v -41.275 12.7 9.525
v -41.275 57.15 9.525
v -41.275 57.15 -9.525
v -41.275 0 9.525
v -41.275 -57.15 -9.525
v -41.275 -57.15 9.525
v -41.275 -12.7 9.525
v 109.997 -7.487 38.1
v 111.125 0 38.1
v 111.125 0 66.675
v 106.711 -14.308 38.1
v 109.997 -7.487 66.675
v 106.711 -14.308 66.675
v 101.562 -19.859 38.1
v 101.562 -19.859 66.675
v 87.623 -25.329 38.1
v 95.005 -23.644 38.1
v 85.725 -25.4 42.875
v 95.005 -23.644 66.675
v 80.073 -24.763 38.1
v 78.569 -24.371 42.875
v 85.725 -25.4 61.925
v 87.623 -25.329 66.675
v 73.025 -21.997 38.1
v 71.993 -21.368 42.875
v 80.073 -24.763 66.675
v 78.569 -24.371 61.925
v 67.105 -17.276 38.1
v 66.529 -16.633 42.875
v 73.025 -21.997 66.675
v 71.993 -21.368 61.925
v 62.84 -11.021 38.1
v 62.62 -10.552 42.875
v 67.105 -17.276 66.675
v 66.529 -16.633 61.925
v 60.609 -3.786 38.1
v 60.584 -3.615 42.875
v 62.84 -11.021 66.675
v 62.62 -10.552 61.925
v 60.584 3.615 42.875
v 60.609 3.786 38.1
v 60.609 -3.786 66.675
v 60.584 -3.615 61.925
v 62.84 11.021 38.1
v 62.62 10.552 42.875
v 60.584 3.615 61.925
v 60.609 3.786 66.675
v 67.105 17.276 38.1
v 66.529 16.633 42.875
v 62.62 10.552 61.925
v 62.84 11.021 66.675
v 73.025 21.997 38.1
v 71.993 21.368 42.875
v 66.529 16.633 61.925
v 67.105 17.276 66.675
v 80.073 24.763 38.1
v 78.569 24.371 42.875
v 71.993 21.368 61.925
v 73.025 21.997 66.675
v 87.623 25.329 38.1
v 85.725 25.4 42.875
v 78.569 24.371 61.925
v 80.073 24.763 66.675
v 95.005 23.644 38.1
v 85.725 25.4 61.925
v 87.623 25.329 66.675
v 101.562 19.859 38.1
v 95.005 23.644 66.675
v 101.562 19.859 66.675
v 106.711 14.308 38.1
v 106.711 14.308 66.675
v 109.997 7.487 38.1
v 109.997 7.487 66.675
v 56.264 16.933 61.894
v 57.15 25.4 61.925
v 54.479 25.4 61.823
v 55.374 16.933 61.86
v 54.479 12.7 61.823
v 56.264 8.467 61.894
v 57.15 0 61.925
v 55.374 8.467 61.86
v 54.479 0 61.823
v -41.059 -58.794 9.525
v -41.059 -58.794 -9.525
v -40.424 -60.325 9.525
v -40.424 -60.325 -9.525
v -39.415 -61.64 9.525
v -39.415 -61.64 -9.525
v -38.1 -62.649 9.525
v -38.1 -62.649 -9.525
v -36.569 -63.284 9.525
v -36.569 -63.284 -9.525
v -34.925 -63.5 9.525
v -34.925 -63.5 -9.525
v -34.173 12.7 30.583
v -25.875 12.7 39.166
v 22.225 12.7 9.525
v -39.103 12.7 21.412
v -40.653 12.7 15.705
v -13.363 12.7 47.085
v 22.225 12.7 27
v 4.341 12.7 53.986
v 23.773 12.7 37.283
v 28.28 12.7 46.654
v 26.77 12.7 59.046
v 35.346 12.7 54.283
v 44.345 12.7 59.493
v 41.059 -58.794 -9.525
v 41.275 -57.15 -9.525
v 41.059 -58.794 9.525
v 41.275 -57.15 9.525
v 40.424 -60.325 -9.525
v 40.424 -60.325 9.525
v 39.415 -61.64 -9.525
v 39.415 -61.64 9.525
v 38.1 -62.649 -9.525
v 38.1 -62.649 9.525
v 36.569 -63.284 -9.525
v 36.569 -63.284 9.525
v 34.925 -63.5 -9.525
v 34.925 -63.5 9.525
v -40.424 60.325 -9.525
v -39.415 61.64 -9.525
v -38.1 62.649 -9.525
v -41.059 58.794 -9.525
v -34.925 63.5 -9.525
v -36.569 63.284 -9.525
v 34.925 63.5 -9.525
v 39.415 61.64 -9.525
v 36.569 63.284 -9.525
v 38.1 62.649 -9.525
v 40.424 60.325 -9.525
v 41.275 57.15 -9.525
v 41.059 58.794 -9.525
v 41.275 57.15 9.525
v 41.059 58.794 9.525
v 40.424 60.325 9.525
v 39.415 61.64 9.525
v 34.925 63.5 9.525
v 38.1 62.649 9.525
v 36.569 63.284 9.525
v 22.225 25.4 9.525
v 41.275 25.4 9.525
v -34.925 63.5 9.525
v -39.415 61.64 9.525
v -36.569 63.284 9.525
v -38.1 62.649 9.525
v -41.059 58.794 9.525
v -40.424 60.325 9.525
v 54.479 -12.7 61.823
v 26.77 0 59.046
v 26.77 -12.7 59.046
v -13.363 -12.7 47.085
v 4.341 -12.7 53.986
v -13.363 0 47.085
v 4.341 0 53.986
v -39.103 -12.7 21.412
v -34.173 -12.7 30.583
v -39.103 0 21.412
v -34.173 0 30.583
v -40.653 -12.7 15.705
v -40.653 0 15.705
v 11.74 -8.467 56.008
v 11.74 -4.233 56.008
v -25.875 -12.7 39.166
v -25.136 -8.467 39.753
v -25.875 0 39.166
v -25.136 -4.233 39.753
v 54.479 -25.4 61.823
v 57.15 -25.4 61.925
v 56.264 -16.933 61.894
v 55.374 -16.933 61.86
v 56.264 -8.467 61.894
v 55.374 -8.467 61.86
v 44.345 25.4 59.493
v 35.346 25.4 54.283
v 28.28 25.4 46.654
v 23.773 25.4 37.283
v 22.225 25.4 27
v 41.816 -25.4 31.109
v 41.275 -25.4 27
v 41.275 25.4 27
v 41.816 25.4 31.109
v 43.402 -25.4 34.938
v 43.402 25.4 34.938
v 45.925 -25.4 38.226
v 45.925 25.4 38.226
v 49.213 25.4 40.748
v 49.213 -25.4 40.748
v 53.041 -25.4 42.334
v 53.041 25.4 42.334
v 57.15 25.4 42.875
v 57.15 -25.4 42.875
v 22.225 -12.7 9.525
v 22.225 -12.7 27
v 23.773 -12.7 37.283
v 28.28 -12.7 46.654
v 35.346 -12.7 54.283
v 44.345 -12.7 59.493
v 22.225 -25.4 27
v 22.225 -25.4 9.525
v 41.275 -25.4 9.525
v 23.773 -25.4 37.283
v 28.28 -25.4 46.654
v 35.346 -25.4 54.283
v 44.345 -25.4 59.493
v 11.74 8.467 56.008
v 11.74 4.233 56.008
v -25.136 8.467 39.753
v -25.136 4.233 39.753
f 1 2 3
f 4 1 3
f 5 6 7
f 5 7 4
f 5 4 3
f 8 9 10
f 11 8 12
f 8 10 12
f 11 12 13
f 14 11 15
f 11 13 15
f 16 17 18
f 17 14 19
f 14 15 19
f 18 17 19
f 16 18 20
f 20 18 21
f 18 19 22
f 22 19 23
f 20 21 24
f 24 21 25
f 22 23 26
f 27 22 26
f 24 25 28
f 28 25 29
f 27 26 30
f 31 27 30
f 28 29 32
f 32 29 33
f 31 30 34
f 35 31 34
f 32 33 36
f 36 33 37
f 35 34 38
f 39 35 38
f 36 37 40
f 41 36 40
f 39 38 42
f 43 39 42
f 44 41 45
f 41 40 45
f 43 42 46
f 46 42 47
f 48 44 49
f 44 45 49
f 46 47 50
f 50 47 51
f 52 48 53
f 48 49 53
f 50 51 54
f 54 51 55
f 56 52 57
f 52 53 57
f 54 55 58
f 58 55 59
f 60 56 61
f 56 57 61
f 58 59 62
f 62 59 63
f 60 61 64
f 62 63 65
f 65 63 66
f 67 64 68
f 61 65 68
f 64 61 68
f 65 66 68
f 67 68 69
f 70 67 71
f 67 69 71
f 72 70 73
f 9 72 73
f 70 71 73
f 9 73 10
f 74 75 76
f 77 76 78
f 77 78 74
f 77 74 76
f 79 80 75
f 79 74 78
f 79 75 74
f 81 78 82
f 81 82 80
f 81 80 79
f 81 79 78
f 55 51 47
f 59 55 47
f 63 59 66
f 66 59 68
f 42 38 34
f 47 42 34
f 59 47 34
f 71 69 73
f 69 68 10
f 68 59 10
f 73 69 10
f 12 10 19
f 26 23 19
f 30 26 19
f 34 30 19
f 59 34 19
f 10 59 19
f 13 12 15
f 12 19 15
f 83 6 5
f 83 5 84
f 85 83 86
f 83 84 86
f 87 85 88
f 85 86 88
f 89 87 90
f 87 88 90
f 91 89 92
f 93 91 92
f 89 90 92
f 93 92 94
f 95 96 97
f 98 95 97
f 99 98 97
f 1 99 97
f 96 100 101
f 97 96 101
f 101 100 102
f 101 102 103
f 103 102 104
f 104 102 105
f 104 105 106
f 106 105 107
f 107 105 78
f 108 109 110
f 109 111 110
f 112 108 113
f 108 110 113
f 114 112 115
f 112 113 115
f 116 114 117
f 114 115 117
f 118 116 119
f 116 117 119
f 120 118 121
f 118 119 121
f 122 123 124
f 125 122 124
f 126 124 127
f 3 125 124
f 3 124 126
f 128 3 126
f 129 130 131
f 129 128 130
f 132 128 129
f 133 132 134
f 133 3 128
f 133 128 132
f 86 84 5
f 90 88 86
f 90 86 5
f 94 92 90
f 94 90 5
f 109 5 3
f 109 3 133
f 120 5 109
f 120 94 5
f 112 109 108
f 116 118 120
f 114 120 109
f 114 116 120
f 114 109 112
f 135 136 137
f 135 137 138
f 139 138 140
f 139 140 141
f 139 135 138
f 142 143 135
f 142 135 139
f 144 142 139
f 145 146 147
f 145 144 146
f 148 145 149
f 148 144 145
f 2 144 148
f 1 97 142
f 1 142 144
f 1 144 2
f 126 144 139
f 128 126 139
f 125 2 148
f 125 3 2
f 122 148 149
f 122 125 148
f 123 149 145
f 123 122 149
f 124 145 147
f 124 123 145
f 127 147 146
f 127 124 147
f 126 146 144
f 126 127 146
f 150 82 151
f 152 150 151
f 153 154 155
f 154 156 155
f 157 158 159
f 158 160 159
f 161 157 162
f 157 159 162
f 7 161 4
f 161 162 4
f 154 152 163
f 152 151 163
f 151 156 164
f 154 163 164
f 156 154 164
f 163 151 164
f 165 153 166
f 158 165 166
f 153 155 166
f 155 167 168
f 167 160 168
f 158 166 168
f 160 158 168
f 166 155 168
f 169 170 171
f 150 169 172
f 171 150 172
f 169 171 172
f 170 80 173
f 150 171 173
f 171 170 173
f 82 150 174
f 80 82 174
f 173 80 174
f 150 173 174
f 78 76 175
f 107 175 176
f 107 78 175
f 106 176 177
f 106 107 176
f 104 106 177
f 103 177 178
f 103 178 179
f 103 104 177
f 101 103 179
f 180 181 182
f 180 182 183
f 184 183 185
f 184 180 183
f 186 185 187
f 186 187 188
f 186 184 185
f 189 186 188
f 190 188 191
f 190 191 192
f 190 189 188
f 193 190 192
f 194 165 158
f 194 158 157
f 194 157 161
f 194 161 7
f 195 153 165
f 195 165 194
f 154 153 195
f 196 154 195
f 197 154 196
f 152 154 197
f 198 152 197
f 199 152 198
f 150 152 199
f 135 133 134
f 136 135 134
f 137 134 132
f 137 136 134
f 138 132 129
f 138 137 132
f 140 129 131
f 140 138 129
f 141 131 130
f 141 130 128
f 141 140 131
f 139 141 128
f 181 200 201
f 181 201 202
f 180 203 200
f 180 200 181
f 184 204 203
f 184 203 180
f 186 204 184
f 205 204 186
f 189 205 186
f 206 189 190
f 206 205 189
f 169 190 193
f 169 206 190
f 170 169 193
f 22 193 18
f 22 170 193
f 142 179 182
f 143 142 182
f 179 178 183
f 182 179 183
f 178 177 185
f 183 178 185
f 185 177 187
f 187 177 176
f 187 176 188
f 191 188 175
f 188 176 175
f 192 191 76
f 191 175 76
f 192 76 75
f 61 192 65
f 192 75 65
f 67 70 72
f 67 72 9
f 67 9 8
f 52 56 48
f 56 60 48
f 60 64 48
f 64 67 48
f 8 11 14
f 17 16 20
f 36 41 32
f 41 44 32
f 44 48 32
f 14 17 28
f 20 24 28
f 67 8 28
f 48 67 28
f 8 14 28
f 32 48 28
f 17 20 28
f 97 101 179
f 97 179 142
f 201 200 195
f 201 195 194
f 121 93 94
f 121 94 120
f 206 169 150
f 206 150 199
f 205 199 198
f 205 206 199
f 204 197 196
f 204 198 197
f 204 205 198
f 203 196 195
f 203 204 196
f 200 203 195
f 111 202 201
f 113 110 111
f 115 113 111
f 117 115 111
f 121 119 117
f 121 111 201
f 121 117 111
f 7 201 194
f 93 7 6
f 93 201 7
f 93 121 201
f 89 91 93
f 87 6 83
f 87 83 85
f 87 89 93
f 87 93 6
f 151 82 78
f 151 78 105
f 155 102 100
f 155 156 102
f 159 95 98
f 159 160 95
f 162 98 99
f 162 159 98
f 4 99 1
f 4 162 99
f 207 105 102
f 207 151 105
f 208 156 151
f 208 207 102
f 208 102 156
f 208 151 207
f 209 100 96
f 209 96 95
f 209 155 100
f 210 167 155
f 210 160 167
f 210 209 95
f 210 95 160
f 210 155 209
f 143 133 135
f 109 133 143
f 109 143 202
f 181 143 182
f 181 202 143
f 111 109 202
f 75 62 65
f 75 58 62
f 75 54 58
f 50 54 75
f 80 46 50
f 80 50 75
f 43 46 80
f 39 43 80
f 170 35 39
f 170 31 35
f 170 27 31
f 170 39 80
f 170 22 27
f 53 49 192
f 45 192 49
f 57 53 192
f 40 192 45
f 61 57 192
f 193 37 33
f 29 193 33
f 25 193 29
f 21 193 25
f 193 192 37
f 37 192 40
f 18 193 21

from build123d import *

# Parameters (mm, degrees)
F1_DEPTH = 63.5
F0_W     = 25.4
F0_H     = 19.05
F2_DEPTH = 25.4
F3_DEPTH = 12.7
F5_R     = 6.35


with BuildPart() as f1:
    # F0 (on Front) → F1 (new body, symmetric)
    with BuildSketch(Plane.XZ):
        Polygon((41.275, -9.525), (41.275, 9.525), (22.225, 9.525), (-41.275, 9.525), (-41.275, -9.525), align=None)
    extrude(amount=F1_DEPTH, both=True)

    # F0 (on Front) → F2 (join, symmetric)
    with BuildSketch(Plane.XZ):
        with BuildLine():
            Line((22.225, 9.525), (41.275, 9.525))
            Line((41.275, 9.525), (41.275, 27.0002))
            ThreePointArc((41.275, 27.0002), (45.9246798487, 38.2255201513), (57.15, 42.8752))
            Line((57.15, 42.8752), (60.325, 42.8752))
            Line((60.325, 42.8752), (60.325, 61.9252))
            Line((60.325, 61.9252), (57.15, 61.9252))
            add(Edge.make_bspline(
                [(57.15, 61.9252), (56.2667077822, 61.896021647), (55.3761352592, 61.8619828638), (54.478998675, 61.8229135204)],
                knots=[0, 0, 0, 0, 2.4041331296, 2.4041331296, 2.4041331296, 2.4041331296], degree=3))
            ThreePointArc((54.478998675, 61.8229135204), (31.527350388, 50.7327820732), (22.225, 27.0002))
            Line((22.225, 27.0002), (22.225, 9.525))
        make_face()
        with Locations((73.025, 52.4002)):
            Rectangle(F0_W, F0_H)
    extrude(amount=F2_DEPTH, both=True)

    # F0 (on Front) → F3 (join, symmetric)
    with BuildSketch(Plane.XZ):
        with BuildLine():
            Line((-41.275, 9.525), (22.225, 9.525))
            Line((22.225, 9.525), (22.225, 27.0002))
            ThreePointArc((22.225, 27.0002), (31.527350388, 50.7327820732), (54.478998675, 61.8229135204))
            add(Edge.make_bspline(
                [(54.478998675, 61.8229135204), (13.7666264229, 60.0499330393), (-40.4636171483, 47.9171368139), (-41.275, 9.525)],
                knots=[2.4041331296, 2.4041331296, 2.4041331296, 2.4041331296, 111.5045361635, 111.5045361635, 111.5045361635, 111.5045361635], degree=3))
        make_face()
    extrude(amount=F3_DEPTH, both=True)

    # F0 (on Front) → F4 (revolve)
    with BuildSketch(Plane.XZ):
        Polygon((85.725, 61.9252), (85.725, 42.8752), (85.725, 38.1), (111.125, 38.1), (111.125, 66.675), (85.725, 66.675), align=None)
    revolve(axis=Axis((85.725, 0, 52.3875), (0, 0, -1)))

    # F5
    f5_edges = [f1.edges().sort_by_distance(p)[0] for p in [
        (-41.275, -63.5, 0),
        (41.275, -63.5, 0),
        (41.275, 63.5, 0),
        (-41.275, 63.5, 0),
    ]]
    fillet(f5_edges, radius=F5_R)


solid = f1.part
